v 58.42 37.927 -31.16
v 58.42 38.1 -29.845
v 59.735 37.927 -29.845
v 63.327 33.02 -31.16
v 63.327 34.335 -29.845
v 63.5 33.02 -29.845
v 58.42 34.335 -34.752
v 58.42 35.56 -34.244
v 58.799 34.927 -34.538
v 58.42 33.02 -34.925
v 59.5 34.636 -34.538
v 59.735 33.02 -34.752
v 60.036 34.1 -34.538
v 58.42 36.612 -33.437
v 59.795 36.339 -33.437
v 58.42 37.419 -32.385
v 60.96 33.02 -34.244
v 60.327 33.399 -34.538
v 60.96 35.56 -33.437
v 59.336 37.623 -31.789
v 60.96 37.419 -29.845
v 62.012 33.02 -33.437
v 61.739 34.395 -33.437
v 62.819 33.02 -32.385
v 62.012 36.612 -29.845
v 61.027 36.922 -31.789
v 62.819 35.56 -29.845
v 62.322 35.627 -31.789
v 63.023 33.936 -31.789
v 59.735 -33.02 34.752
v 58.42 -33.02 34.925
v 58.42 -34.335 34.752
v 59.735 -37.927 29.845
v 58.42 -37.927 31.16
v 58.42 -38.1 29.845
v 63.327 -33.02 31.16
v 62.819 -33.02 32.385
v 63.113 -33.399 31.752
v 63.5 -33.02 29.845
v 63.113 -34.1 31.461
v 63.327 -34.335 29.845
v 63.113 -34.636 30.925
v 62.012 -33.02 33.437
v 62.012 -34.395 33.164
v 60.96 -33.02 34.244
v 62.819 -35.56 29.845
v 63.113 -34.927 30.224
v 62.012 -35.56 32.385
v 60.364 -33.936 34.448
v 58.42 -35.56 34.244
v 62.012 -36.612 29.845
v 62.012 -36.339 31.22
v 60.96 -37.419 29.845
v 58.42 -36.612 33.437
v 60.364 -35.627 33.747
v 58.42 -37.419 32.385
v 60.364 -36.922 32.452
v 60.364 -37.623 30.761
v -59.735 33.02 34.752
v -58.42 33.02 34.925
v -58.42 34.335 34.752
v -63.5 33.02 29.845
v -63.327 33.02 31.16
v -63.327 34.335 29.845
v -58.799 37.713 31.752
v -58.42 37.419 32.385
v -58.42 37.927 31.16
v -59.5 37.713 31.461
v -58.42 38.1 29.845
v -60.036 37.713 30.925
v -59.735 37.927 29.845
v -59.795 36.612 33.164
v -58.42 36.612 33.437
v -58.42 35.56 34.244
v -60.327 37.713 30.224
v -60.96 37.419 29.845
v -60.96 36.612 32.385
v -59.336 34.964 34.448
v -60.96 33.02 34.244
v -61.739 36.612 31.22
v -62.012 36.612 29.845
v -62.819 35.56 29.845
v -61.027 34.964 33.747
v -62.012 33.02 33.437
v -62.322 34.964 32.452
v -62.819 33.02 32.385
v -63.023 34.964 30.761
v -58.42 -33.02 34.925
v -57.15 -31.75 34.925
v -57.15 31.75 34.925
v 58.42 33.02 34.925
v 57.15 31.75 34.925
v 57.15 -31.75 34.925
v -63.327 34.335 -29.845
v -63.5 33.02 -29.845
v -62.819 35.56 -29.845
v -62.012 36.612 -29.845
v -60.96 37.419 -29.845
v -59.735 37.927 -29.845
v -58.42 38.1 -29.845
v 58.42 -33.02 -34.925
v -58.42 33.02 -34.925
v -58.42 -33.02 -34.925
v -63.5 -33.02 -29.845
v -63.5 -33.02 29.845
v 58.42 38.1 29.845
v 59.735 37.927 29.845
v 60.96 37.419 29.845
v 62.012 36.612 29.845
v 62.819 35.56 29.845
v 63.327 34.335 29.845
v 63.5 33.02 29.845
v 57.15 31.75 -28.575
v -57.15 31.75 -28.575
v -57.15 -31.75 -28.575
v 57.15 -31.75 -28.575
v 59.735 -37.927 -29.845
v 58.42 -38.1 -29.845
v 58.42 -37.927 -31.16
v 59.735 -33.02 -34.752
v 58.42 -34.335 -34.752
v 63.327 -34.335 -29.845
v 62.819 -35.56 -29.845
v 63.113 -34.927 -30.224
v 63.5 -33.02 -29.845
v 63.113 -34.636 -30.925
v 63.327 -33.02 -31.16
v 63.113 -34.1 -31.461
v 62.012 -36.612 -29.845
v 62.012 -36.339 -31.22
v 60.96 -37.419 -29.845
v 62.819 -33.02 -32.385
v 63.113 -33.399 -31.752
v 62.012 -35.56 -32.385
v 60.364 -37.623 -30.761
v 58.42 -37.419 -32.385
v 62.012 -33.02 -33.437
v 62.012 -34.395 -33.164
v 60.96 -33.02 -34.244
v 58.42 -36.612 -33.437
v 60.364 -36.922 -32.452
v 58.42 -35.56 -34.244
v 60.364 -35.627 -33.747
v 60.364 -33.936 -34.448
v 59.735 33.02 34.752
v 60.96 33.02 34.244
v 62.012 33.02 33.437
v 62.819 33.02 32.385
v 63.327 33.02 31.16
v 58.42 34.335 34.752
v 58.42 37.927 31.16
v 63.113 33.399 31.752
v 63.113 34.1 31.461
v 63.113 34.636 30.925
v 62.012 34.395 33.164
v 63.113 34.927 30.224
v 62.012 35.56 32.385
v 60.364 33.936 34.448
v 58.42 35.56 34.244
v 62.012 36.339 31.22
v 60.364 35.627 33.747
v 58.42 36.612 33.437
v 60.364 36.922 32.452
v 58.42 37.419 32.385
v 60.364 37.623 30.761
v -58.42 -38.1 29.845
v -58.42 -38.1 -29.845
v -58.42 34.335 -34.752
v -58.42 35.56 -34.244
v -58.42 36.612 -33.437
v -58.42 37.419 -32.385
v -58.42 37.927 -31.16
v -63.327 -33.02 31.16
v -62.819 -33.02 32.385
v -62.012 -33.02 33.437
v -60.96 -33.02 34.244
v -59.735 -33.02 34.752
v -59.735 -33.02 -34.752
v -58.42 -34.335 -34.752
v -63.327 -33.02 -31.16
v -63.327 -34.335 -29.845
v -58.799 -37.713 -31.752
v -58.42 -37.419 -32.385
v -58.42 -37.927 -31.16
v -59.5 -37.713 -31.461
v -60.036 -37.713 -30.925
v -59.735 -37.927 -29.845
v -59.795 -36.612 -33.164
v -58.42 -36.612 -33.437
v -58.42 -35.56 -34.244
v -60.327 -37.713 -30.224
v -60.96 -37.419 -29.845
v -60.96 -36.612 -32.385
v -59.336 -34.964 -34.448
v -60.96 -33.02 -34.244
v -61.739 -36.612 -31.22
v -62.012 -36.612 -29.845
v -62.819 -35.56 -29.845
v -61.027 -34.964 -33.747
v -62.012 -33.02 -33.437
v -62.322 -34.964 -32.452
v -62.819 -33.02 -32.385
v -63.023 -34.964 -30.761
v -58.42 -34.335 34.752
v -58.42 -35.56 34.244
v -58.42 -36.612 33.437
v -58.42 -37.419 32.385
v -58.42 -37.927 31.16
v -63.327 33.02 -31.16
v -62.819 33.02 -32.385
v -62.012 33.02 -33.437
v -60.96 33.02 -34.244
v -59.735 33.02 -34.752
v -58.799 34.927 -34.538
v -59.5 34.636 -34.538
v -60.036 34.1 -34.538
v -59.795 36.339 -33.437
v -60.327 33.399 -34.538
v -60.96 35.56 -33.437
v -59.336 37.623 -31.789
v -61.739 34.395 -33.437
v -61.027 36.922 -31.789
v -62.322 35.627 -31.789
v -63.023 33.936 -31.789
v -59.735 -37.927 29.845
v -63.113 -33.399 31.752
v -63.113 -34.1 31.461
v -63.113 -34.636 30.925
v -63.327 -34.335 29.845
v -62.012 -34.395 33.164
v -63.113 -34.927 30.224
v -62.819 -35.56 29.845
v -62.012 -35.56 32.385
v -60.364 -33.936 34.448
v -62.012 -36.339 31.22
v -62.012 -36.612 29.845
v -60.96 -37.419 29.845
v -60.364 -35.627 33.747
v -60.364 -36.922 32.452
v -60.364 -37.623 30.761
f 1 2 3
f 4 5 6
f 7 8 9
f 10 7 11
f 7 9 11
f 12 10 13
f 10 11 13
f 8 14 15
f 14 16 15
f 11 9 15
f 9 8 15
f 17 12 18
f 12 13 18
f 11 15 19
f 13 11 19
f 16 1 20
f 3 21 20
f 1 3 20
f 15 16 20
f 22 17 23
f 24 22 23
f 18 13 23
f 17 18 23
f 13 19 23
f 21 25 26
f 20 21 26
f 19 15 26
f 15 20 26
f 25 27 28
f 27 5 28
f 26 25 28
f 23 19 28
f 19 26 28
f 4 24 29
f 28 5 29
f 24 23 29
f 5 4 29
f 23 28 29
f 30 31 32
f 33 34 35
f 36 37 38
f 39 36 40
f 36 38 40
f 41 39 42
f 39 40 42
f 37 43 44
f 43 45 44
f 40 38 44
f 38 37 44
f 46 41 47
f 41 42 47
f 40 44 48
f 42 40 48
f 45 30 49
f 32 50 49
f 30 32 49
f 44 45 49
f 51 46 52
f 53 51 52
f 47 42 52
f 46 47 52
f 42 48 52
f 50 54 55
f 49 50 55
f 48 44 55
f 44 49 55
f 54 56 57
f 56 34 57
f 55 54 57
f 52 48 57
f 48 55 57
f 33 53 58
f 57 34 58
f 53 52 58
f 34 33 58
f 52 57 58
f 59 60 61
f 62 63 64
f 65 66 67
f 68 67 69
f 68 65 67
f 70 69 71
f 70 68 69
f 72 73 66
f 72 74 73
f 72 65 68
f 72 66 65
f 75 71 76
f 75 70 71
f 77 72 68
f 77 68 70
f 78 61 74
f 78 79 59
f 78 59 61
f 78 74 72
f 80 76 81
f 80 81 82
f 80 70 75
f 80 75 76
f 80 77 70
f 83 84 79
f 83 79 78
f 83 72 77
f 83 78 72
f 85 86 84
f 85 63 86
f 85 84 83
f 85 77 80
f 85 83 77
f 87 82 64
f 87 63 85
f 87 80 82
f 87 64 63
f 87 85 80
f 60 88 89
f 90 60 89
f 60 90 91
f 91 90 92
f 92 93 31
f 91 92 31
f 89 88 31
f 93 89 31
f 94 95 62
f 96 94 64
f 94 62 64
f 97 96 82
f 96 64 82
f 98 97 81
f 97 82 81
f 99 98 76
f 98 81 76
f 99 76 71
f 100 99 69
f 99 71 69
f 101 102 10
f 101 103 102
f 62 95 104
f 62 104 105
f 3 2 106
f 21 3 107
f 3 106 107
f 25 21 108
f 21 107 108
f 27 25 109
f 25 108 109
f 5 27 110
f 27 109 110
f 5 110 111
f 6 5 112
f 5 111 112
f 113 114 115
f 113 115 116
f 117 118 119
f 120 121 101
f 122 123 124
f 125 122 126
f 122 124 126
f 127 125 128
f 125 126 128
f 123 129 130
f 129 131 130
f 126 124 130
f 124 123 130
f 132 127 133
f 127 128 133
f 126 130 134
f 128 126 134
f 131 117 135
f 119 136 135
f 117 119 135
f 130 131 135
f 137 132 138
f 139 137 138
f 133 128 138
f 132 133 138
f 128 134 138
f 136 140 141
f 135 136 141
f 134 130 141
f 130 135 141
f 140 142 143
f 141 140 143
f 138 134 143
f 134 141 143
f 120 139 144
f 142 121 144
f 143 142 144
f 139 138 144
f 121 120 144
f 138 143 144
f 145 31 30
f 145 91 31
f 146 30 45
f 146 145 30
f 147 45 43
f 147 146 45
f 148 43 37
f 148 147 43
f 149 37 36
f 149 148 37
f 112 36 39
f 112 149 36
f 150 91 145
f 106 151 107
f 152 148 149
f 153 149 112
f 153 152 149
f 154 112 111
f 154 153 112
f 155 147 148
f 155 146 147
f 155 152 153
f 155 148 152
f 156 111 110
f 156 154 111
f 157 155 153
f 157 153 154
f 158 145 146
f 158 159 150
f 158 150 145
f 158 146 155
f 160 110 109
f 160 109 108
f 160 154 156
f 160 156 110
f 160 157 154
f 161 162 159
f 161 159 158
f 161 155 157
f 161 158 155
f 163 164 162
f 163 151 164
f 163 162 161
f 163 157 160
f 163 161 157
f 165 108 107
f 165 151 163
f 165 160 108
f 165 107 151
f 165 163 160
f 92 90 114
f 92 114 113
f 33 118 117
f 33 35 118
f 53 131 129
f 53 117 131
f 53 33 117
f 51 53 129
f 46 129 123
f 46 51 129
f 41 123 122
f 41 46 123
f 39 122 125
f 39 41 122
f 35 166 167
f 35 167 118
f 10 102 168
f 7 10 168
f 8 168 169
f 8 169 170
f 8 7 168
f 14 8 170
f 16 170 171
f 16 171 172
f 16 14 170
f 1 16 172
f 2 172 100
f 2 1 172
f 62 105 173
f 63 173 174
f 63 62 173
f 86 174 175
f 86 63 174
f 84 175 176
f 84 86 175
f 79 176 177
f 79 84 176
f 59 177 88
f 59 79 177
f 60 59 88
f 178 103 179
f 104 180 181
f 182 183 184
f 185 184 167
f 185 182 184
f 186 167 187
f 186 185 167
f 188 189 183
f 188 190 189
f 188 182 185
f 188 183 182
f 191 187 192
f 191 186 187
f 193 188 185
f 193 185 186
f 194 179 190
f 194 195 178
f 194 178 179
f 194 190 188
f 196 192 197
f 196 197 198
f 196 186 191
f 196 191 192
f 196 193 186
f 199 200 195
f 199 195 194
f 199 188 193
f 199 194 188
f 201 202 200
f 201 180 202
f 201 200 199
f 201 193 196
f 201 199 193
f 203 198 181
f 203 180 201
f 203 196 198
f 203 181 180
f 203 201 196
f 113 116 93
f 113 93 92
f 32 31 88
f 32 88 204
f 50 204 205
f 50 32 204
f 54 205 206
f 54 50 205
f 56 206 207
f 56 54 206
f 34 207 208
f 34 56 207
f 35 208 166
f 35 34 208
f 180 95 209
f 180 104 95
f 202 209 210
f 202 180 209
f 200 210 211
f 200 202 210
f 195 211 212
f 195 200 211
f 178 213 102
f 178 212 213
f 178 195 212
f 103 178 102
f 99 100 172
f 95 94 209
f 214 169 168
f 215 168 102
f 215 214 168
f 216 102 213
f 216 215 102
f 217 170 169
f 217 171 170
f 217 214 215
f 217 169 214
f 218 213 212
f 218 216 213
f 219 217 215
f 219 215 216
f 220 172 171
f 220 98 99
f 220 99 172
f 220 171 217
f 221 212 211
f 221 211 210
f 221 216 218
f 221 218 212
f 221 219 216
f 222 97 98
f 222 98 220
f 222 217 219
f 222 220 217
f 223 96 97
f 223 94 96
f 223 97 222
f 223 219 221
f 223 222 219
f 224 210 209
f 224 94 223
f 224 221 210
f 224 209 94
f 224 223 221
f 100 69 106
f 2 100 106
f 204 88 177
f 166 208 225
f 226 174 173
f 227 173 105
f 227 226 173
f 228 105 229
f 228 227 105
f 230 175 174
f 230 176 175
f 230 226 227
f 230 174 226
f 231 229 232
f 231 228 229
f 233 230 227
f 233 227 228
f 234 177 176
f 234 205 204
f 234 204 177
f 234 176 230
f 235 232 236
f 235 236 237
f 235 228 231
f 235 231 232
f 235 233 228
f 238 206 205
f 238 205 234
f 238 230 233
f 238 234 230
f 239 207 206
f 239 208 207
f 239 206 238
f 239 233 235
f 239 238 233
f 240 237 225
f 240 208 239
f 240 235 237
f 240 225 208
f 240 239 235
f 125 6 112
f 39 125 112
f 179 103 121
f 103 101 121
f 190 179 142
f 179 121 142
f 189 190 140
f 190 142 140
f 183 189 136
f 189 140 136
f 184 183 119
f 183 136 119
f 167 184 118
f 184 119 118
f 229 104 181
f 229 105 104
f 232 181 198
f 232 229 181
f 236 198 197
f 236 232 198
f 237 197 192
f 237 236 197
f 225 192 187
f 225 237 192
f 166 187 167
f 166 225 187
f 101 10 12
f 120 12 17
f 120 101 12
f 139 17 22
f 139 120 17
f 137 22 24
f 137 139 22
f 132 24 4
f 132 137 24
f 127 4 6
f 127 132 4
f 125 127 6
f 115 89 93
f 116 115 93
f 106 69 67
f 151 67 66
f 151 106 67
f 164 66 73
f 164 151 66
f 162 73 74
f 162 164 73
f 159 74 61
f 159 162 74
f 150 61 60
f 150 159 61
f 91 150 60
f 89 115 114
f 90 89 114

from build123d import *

# Parameters (mm, degrees)
F0_W     = 127
F0_H     = 69.85
F1_DEPTH = 38.1
F2_W     = 114.3
F2_H     = 63.5
F3_DEPTH = 63.5
F4_R     = 5.08


with BuildPart() as f1:
    # F0 (on Front) → F1 (new body, symmetric)
    with BuildSketch(Plane.XZ):
        Rectangle(F0_W, F0_H)
    extrude(amount=F1_DEPTH, both=True)

    # F2 (on face) → F3 (cut)
    with BuildSketch(Plane.XY.offset(34.925)):
        Rectangle(F2_W, F2_H)
    extrude(amount=-F3_DEPTH, mode=Mode.SUBTRACT)

    # F4
    f4_edges = [f1.edges().sort_by_distance(p)[0] for p in [
        (0, -38.1, 34.925),
        (-63.5, 0, 34.925),
        (0, 38.1, 34.925),
        (63.5, 0, 34.925),
        (63.5, 38.1, 0),
        (-63.5, 38.1, 0),
        (0, 38.1, -34.925),
        (-63.5, 0, -34.925),
        (0, -38.1, -34.925),
        (63.5, -38.1, 0),
        (63.5, 0, -34.925),
        (-63.5, -38.1, 0),
    ]]
    fillet(f4_edges, radius=F4_R)


solid = f1.part
